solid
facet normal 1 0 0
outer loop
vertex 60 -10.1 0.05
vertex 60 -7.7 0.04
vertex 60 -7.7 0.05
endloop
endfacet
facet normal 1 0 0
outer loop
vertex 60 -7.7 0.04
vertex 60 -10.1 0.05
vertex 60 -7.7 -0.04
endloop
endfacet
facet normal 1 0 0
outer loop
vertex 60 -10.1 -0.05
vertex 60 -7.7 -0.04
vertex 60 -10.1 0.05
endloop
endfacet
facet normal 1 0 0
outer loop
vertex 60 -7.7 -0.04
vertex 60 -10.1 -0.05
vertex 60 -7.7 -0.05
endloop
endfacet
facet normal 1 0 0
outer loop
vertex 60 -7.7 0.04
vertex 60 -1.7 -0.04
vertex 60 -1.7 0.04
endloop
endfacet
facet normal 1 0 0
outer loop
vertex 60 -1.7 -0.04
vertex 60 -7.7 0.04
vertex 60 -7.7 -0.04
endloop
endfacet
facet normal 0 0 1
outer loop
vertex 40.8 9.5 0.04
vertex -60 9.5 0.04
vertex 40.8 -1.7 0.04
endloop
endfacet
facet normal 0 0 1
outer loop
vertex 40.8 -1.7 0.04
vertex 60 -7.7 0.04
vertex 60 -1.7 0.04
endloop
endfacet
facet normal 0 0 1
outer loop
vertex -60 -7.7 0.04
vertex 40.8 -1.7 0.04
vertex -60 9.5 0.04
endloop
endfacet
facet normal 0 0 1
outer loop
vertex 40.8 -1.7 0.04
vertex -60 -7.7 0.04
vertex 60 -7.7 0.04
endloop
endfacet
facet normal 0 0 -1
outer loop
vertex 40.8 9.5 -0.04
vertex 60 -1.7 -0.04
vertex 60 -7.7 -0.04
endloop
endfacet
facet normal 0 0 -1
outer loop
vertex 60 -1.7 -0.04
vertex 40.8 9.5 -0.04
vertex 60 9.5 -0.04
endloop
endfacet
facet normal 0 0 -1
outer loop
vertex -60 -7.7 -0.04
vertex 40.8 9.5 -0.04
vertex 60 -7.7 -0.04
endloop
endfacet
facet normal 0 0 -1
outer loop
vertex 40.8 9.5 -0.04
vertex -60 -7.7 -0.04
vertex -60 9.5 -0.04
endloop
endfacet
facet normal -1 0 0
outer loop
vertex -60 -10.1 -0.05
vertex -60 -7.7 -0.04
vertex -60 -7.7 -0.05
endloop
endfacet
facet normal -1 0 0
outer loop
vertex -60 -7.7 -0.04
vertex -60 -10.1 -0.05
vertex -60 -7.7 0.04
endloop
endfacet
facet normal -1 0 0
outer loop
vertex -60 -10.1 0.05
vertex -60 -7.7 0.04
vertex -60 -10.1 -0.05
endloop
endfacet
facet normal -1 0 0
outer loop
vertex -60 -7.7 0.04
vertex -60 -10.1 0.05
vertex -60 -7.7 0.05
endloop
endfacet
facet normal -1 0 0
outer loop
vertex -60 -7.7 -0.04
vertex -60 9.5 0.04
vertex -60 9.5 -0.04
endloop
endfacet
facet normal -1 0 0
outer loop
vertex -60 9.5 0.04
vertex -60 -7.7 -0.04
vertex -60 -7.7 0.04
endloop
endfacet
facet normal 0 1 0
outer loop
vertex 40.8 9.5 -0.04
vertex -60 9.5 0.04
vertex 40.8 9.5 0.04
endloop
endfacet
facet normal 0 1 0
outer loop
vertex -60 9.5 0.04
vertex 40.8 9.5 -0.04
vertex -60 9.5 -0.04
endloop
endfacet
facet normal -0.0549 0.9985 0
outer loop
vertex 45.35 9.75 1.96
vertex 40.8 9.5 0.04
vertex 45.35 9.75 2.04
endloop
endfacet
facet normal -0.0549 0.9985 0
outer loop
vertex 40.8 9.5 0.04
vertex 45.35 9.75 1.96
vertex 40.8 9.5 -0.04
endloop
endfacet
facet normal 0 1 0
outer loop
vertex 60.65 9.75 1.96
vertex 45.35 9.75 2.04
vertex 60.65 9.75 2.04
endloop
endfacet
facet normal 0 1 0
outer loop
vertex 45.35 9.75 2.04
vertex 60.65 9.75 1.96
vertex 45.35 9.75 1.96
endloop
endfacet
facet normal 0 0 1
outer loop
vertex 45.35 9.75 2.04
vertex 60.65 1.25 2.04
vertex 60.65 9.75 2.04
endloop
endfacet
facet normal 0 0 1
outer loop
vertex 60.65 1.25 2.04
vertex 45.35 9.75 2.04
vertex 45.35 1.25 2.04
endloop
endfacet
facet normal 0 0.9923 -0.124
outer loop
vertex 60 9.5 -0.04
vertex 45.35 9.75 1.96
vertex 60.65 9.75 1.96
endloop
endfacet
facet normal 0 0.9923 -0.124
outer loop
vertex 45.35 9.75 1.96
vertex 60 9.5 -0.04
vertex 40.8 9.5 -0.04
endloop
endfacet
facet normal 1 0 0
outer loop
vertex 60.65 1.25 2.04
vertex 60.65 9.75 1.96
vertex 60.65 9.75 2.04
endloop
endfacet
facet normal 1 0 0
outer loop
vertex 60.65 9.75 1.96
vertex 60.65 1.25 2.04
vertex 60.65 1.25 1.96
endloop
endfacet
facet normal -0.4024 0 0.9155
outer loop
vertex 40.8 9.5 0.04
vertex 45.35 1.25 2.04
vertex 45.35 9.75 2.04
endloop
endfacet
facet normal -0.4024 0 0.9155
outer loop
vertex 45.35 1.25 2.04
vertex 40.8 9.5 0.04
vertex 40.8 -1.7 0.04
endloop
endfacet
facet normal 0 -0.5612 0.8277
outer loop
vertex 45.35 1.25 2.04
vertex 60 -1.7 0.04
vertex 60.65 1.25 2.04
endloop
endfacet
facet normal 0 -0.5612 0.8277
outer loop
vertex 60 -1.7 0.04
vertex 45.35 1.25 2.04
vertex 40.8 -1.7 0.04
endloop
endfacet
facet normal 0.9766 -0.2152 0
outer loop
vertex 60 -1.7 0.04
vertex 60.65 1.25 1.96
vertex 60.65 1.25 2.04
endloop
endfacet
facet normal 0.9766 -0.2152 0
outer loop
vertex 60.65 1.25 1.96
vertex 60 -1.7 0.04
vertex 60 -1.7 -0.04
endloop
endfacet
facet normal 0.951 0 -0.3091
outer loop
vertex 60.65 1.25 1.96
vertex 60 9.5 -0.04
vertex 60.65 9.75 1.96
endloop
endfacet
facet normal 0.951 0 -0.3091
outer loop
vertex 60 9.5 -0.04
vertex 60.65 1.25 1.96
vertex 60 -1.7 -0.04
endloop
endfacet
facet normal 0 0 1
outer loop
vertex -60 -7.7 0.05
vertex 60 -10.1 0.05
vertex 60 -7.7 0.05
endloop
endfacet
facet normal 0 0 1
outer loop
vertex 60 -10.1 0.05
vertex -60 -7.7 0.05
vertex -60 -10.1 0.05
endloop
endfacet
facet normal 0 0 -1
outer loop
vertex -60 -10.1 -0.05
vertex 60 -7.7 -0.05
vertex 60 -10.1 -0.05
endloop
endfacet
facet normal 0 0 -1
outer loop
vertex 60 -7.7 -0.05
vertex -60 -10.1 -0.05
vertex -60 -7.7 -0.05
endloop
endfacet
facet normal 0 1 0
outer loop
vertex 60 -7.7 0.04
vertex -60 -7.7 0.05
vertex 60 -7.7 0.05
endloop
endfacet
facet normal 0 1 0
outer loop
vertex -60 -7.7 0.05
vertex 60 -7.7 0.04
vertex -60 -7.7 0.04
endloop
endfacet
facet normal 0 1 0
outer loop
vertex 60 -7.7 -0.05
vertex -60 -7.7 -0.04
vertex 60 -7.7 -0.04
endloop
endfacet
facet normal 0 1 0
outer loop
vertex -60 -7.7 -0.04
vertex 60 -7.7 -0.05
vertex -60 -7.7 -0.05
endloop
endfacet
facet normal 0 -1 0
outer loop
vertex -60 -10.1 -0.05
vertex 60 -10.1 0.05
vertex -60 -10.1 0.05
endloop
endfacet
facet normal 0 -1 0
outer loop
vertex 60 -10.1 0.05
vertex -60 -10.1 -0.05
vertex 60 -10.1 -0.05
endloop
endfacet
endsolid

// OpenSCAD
// Sellotape tape SHEET (single connected solid)
// Simplified: a thin rectangular sheet with a small folded/peeled corner
// to make it recognizable as tape (not a roll).

$fn = 64;

// Parameters
sheet_length    = 120;   // overall tape piece length
sheet_width     = 19;    // tape width
sheet_thickness = 0.08;  // tape thickness (thin)
corner_fold_len = 18;    // length of peeled corner
corner_fold_w   = 10;    // width of peeled corner area
fold_lift       = 2.0;   // how much the corner lifts up
overlap         = 1.2;   // 1-2mm overlap for solid connections

module tape_sheet() {
    union() {
        // Main flat sheet (centered)
        cube([sheet_length, sheet_width, sheet_thickness], center=true);

        // Peeled/folded corner wedge (still one connected solid)
        // Attached at the +X end, +Y edge.
        // Use hull between two thin "tabs" to create a simple lifted corner.
        hull() {
            // Base tab on the sheet surface (overlaps into main sheet)
            translate([
                sheet_length/2 - corner_fold_len/2 - overlap/2,
                sheet_width/2 - corner_fold_w/2 - overlap/2,
                0
            ])
            cube([corner_fold_len + overlap, corner_fold_w + overlap, sheet_thickness], center=true);

            // Lifted tab (slightly smaller, raised in Z and shifted outward)
            translate([
                sheet_length/2 - corner_fold_len/2 + 2,
                sheet_width/2 - corner_fold_w/2 + 1,
                fold_lift
            ])
            cube([corner_fold_len*0.85, corner_fold_w*0.85, sheet_thickness], center=true);
        }

        // Subtle rounded leading edge strip (tiny thickening) to read as tape edge
        // Overlaps into main sheet so it's one solid.
        translate([0, -sheet_width/2 + 0.6, 0])
            cube([sheet_length, 1.2 + overlap, sheet_thickness + 0.02], center=true);
    }
}

// Final output
tape_sheet();
